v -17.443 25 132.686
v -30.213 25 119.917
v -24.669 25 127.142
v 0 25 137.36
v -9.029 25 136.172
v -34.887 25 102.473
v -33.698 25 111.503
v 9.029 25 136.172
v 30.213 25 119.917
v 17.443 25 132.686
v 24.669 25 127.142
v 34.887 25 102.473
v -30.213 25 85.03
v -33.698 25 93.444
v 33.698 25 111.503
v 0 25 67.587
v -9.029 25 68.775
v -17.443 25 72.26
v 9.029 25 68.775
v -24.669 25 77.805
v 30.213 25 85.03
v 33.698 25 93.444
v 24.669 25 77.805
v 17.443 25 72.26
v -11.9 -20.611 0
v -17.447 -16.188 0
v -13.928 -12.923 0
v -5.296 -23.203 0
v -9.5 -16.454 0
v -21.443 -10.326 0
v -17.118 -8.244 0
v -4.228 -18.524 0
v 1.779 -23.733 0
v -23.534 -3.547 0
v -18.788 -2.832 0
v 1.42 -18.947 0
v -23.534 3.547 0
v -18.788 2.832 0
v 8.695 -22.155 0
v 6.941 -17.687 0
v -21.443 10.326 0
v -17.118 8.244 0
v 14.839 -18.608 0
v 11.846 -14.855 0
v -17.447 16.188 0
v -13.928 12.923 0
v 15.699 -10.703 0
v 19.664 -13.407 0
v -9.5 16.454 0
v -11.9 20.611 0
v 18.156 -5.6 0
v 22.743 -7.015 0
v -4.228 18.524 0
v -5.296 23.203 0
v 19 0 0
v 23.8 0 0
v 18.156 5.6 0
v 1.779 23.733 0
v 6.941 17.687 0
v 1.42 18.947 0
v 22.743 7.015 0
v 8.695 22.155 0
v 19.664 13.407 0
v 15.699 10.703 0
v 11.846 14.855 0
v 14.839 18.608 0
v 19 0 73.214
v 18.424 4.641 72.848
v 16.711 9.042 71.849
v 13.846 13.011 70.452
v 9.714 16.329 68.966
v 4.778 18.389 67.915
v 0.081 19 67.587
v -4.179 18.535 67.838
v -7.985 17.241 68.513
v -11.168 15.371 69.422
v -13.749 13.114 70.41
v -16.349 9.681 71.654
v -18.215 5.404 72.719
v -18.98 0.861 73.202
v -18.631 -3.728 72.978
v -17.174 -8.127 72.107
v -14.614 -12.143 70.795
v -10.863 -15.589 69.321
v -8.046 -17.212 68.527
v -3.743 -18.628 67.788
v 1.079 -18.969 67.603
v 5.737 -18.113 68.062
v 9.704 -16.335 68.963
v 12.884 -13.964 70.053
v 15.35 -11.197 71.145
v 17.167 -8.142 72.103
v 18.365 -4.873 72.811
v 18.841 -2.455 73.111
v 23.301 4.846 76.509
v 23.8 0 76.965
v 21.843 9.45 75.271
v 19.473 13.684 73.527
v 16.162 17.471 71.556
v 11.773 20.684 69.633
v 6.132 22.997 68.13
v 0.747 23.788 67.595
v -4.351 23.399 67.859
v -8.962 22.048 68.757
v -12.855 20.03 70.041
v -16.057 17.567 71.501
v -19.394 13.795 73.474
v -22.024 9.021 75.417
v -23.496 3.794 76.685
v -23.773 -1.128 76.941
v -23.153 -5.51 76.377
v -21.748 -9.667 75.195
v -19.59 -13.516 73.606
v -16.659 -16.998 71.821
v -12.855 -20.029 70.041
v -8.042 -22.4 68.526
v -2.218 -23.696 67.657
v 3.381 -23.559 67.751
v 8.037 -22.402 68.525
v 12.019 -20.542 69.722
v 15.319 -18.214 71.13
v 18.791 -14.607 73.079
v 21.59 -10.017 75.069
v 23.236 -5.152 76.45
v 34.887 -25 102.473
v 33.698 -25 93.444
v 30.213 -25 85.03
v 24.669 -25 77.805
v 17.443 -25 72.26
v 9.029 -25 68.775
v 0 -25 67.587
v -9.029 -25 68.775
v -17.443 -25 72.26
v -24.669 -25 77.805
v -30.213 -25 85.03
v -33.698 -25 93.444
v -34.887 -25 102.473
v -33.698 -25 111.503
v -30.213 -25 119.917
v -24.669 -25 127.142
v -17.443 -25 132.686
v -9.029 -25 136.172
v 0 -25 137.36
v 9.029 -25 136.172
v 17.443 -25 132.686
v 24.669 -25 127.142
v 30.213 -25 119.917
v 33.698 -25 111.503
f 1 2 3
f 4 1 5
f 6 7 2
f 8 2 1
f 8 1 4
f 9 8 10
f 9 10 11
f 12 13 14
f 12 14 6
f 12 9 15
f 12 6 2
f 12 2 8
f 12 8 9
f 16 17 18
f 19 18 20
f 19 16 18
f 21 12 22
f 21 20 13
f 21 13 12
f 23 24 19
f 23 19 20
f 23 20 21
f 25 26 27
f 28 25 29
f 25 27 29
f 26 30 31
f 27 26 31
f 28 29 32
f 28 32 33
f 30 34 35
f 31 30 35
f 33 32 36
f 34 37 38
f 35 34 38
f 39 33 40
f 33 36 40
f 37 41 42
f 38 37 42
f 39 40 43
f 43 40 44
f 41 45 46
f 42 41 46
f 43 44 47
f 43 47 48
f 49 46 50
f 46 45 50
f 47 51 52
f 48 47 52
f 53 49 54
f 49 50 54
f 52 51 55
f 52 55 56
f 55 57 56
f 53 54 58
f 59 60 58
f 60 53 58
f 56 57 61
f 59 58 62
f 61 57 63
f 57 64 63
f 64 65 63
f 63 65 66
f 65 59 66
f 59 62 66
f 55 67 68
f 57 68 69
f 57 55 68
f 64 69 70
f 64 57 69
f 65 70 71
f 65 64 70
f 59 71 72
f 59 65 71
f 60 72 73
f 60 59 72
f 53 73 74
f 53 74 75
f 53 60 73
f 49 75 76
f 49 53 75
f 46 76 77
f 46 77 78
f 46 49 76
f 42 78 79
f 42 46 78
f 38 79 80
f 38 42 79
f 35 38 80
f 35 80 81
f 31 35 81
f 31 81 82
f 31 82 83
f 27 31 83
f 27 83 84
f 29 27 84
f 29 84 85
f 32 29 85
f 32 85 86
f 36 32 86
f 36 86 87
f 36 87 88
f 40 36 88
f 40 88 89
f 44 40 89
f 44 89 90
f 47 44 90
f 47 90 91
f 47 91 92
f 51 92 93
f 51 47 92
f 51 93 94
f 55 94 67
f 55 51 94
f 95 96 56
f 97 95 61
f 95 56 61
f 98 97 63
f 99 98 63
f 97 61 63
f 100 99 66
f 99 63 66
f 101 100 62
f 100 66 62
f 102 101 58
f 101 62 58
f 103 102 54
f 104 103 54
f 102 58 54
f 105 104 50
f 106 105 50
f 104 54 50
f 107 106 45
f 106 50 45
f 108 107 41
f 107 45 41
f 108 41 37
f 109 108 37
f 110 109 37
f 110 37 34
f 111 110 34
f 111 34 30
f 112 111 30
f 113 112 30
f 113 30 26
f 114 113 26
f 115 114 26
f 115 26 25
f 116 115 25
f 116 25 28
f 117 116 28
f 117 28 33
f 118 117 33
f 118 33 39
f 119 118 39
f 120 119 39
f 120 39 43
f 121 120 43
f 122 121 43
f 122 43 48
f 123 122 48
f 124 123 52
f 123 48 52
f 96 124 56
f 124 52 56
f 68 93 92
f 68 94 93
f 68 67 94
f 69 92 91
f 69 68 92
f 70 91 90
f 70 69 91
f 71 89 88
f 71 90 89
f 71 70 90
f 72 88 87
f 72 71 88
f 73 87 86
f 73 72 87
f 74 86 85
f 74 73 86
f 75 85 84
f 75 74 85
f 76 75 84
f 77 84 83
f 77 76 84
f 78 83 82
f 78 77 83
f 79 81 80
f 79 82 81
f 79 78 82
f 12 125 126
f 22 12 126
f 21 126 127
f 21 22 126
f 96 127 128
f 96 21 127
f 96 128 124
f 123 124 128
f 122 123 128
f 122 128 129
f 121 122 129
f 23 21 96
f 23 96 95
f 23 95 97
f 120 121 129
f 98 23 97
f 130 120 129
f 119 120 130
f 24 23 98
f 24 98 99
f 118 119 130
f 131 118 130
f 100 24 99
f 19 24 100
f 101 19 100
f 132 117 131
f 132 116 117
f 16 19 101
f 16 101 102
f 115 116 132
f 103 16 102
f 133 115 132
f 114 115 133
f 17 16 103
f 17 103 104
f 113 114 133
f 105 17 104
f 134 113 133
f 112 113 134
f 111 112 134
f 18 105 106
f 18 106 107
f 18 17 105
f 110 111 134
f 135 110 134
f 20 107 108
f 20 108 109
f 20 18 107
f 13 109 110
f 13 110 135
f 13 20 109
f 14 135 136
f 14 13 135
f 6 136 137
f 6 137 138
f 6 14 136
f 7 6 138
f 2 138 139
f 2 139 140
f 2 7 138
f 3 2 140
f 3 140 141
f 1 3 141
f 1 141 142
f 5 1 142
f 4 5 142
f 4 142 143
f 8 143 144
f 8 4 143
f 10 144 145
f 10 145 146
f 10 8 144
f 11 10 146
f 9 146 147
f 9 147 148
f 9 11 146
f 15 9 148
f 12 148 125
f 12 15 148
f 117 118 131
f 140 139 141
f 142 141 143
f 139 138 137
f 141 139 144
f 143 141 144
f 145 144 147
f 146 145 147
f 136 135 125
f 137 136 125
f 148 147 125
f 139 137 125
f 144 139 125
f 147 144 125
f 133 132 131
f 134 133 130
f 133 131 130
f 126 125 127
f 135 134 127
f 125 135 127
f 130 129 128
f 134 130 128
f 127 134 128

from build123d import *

# Parameters (mm, degrees)
SKETCH1_R           = 23.8
SKETCH1_R_2         = 19
BOSS_EXTRUDE1_DEPTH = 80
SKETCH5_R           = 34.886960806
BOSS_EXTRUDE2_DEPTH = 25


with BuildPart() as part:
    # Sketch1 → Boss-Extrude1 (new body)
    with BuildSketch(Plane.XY):
        Circle(SKETCH1_R)
        Circle(SKETCH1_R_2, mode=Mode.SUBTRACT)
    extrude(amount=BOSS_EXTRUDE1_DEPTH)

    # Sketch5 → Boss-Extrude2 (add, symmetric)
    with BuildSketch(Plane(origin=(0, 0, 0), x_dir=(1, 0, 0), z_dir=(0, 1, 0))):
        with Locations((0, -102.473472637)):
            Circle(SKETCH5_R)
    extrude(amount=BOSS_EXTRUDE2_DEPTH, both=True)


solid = part.part
